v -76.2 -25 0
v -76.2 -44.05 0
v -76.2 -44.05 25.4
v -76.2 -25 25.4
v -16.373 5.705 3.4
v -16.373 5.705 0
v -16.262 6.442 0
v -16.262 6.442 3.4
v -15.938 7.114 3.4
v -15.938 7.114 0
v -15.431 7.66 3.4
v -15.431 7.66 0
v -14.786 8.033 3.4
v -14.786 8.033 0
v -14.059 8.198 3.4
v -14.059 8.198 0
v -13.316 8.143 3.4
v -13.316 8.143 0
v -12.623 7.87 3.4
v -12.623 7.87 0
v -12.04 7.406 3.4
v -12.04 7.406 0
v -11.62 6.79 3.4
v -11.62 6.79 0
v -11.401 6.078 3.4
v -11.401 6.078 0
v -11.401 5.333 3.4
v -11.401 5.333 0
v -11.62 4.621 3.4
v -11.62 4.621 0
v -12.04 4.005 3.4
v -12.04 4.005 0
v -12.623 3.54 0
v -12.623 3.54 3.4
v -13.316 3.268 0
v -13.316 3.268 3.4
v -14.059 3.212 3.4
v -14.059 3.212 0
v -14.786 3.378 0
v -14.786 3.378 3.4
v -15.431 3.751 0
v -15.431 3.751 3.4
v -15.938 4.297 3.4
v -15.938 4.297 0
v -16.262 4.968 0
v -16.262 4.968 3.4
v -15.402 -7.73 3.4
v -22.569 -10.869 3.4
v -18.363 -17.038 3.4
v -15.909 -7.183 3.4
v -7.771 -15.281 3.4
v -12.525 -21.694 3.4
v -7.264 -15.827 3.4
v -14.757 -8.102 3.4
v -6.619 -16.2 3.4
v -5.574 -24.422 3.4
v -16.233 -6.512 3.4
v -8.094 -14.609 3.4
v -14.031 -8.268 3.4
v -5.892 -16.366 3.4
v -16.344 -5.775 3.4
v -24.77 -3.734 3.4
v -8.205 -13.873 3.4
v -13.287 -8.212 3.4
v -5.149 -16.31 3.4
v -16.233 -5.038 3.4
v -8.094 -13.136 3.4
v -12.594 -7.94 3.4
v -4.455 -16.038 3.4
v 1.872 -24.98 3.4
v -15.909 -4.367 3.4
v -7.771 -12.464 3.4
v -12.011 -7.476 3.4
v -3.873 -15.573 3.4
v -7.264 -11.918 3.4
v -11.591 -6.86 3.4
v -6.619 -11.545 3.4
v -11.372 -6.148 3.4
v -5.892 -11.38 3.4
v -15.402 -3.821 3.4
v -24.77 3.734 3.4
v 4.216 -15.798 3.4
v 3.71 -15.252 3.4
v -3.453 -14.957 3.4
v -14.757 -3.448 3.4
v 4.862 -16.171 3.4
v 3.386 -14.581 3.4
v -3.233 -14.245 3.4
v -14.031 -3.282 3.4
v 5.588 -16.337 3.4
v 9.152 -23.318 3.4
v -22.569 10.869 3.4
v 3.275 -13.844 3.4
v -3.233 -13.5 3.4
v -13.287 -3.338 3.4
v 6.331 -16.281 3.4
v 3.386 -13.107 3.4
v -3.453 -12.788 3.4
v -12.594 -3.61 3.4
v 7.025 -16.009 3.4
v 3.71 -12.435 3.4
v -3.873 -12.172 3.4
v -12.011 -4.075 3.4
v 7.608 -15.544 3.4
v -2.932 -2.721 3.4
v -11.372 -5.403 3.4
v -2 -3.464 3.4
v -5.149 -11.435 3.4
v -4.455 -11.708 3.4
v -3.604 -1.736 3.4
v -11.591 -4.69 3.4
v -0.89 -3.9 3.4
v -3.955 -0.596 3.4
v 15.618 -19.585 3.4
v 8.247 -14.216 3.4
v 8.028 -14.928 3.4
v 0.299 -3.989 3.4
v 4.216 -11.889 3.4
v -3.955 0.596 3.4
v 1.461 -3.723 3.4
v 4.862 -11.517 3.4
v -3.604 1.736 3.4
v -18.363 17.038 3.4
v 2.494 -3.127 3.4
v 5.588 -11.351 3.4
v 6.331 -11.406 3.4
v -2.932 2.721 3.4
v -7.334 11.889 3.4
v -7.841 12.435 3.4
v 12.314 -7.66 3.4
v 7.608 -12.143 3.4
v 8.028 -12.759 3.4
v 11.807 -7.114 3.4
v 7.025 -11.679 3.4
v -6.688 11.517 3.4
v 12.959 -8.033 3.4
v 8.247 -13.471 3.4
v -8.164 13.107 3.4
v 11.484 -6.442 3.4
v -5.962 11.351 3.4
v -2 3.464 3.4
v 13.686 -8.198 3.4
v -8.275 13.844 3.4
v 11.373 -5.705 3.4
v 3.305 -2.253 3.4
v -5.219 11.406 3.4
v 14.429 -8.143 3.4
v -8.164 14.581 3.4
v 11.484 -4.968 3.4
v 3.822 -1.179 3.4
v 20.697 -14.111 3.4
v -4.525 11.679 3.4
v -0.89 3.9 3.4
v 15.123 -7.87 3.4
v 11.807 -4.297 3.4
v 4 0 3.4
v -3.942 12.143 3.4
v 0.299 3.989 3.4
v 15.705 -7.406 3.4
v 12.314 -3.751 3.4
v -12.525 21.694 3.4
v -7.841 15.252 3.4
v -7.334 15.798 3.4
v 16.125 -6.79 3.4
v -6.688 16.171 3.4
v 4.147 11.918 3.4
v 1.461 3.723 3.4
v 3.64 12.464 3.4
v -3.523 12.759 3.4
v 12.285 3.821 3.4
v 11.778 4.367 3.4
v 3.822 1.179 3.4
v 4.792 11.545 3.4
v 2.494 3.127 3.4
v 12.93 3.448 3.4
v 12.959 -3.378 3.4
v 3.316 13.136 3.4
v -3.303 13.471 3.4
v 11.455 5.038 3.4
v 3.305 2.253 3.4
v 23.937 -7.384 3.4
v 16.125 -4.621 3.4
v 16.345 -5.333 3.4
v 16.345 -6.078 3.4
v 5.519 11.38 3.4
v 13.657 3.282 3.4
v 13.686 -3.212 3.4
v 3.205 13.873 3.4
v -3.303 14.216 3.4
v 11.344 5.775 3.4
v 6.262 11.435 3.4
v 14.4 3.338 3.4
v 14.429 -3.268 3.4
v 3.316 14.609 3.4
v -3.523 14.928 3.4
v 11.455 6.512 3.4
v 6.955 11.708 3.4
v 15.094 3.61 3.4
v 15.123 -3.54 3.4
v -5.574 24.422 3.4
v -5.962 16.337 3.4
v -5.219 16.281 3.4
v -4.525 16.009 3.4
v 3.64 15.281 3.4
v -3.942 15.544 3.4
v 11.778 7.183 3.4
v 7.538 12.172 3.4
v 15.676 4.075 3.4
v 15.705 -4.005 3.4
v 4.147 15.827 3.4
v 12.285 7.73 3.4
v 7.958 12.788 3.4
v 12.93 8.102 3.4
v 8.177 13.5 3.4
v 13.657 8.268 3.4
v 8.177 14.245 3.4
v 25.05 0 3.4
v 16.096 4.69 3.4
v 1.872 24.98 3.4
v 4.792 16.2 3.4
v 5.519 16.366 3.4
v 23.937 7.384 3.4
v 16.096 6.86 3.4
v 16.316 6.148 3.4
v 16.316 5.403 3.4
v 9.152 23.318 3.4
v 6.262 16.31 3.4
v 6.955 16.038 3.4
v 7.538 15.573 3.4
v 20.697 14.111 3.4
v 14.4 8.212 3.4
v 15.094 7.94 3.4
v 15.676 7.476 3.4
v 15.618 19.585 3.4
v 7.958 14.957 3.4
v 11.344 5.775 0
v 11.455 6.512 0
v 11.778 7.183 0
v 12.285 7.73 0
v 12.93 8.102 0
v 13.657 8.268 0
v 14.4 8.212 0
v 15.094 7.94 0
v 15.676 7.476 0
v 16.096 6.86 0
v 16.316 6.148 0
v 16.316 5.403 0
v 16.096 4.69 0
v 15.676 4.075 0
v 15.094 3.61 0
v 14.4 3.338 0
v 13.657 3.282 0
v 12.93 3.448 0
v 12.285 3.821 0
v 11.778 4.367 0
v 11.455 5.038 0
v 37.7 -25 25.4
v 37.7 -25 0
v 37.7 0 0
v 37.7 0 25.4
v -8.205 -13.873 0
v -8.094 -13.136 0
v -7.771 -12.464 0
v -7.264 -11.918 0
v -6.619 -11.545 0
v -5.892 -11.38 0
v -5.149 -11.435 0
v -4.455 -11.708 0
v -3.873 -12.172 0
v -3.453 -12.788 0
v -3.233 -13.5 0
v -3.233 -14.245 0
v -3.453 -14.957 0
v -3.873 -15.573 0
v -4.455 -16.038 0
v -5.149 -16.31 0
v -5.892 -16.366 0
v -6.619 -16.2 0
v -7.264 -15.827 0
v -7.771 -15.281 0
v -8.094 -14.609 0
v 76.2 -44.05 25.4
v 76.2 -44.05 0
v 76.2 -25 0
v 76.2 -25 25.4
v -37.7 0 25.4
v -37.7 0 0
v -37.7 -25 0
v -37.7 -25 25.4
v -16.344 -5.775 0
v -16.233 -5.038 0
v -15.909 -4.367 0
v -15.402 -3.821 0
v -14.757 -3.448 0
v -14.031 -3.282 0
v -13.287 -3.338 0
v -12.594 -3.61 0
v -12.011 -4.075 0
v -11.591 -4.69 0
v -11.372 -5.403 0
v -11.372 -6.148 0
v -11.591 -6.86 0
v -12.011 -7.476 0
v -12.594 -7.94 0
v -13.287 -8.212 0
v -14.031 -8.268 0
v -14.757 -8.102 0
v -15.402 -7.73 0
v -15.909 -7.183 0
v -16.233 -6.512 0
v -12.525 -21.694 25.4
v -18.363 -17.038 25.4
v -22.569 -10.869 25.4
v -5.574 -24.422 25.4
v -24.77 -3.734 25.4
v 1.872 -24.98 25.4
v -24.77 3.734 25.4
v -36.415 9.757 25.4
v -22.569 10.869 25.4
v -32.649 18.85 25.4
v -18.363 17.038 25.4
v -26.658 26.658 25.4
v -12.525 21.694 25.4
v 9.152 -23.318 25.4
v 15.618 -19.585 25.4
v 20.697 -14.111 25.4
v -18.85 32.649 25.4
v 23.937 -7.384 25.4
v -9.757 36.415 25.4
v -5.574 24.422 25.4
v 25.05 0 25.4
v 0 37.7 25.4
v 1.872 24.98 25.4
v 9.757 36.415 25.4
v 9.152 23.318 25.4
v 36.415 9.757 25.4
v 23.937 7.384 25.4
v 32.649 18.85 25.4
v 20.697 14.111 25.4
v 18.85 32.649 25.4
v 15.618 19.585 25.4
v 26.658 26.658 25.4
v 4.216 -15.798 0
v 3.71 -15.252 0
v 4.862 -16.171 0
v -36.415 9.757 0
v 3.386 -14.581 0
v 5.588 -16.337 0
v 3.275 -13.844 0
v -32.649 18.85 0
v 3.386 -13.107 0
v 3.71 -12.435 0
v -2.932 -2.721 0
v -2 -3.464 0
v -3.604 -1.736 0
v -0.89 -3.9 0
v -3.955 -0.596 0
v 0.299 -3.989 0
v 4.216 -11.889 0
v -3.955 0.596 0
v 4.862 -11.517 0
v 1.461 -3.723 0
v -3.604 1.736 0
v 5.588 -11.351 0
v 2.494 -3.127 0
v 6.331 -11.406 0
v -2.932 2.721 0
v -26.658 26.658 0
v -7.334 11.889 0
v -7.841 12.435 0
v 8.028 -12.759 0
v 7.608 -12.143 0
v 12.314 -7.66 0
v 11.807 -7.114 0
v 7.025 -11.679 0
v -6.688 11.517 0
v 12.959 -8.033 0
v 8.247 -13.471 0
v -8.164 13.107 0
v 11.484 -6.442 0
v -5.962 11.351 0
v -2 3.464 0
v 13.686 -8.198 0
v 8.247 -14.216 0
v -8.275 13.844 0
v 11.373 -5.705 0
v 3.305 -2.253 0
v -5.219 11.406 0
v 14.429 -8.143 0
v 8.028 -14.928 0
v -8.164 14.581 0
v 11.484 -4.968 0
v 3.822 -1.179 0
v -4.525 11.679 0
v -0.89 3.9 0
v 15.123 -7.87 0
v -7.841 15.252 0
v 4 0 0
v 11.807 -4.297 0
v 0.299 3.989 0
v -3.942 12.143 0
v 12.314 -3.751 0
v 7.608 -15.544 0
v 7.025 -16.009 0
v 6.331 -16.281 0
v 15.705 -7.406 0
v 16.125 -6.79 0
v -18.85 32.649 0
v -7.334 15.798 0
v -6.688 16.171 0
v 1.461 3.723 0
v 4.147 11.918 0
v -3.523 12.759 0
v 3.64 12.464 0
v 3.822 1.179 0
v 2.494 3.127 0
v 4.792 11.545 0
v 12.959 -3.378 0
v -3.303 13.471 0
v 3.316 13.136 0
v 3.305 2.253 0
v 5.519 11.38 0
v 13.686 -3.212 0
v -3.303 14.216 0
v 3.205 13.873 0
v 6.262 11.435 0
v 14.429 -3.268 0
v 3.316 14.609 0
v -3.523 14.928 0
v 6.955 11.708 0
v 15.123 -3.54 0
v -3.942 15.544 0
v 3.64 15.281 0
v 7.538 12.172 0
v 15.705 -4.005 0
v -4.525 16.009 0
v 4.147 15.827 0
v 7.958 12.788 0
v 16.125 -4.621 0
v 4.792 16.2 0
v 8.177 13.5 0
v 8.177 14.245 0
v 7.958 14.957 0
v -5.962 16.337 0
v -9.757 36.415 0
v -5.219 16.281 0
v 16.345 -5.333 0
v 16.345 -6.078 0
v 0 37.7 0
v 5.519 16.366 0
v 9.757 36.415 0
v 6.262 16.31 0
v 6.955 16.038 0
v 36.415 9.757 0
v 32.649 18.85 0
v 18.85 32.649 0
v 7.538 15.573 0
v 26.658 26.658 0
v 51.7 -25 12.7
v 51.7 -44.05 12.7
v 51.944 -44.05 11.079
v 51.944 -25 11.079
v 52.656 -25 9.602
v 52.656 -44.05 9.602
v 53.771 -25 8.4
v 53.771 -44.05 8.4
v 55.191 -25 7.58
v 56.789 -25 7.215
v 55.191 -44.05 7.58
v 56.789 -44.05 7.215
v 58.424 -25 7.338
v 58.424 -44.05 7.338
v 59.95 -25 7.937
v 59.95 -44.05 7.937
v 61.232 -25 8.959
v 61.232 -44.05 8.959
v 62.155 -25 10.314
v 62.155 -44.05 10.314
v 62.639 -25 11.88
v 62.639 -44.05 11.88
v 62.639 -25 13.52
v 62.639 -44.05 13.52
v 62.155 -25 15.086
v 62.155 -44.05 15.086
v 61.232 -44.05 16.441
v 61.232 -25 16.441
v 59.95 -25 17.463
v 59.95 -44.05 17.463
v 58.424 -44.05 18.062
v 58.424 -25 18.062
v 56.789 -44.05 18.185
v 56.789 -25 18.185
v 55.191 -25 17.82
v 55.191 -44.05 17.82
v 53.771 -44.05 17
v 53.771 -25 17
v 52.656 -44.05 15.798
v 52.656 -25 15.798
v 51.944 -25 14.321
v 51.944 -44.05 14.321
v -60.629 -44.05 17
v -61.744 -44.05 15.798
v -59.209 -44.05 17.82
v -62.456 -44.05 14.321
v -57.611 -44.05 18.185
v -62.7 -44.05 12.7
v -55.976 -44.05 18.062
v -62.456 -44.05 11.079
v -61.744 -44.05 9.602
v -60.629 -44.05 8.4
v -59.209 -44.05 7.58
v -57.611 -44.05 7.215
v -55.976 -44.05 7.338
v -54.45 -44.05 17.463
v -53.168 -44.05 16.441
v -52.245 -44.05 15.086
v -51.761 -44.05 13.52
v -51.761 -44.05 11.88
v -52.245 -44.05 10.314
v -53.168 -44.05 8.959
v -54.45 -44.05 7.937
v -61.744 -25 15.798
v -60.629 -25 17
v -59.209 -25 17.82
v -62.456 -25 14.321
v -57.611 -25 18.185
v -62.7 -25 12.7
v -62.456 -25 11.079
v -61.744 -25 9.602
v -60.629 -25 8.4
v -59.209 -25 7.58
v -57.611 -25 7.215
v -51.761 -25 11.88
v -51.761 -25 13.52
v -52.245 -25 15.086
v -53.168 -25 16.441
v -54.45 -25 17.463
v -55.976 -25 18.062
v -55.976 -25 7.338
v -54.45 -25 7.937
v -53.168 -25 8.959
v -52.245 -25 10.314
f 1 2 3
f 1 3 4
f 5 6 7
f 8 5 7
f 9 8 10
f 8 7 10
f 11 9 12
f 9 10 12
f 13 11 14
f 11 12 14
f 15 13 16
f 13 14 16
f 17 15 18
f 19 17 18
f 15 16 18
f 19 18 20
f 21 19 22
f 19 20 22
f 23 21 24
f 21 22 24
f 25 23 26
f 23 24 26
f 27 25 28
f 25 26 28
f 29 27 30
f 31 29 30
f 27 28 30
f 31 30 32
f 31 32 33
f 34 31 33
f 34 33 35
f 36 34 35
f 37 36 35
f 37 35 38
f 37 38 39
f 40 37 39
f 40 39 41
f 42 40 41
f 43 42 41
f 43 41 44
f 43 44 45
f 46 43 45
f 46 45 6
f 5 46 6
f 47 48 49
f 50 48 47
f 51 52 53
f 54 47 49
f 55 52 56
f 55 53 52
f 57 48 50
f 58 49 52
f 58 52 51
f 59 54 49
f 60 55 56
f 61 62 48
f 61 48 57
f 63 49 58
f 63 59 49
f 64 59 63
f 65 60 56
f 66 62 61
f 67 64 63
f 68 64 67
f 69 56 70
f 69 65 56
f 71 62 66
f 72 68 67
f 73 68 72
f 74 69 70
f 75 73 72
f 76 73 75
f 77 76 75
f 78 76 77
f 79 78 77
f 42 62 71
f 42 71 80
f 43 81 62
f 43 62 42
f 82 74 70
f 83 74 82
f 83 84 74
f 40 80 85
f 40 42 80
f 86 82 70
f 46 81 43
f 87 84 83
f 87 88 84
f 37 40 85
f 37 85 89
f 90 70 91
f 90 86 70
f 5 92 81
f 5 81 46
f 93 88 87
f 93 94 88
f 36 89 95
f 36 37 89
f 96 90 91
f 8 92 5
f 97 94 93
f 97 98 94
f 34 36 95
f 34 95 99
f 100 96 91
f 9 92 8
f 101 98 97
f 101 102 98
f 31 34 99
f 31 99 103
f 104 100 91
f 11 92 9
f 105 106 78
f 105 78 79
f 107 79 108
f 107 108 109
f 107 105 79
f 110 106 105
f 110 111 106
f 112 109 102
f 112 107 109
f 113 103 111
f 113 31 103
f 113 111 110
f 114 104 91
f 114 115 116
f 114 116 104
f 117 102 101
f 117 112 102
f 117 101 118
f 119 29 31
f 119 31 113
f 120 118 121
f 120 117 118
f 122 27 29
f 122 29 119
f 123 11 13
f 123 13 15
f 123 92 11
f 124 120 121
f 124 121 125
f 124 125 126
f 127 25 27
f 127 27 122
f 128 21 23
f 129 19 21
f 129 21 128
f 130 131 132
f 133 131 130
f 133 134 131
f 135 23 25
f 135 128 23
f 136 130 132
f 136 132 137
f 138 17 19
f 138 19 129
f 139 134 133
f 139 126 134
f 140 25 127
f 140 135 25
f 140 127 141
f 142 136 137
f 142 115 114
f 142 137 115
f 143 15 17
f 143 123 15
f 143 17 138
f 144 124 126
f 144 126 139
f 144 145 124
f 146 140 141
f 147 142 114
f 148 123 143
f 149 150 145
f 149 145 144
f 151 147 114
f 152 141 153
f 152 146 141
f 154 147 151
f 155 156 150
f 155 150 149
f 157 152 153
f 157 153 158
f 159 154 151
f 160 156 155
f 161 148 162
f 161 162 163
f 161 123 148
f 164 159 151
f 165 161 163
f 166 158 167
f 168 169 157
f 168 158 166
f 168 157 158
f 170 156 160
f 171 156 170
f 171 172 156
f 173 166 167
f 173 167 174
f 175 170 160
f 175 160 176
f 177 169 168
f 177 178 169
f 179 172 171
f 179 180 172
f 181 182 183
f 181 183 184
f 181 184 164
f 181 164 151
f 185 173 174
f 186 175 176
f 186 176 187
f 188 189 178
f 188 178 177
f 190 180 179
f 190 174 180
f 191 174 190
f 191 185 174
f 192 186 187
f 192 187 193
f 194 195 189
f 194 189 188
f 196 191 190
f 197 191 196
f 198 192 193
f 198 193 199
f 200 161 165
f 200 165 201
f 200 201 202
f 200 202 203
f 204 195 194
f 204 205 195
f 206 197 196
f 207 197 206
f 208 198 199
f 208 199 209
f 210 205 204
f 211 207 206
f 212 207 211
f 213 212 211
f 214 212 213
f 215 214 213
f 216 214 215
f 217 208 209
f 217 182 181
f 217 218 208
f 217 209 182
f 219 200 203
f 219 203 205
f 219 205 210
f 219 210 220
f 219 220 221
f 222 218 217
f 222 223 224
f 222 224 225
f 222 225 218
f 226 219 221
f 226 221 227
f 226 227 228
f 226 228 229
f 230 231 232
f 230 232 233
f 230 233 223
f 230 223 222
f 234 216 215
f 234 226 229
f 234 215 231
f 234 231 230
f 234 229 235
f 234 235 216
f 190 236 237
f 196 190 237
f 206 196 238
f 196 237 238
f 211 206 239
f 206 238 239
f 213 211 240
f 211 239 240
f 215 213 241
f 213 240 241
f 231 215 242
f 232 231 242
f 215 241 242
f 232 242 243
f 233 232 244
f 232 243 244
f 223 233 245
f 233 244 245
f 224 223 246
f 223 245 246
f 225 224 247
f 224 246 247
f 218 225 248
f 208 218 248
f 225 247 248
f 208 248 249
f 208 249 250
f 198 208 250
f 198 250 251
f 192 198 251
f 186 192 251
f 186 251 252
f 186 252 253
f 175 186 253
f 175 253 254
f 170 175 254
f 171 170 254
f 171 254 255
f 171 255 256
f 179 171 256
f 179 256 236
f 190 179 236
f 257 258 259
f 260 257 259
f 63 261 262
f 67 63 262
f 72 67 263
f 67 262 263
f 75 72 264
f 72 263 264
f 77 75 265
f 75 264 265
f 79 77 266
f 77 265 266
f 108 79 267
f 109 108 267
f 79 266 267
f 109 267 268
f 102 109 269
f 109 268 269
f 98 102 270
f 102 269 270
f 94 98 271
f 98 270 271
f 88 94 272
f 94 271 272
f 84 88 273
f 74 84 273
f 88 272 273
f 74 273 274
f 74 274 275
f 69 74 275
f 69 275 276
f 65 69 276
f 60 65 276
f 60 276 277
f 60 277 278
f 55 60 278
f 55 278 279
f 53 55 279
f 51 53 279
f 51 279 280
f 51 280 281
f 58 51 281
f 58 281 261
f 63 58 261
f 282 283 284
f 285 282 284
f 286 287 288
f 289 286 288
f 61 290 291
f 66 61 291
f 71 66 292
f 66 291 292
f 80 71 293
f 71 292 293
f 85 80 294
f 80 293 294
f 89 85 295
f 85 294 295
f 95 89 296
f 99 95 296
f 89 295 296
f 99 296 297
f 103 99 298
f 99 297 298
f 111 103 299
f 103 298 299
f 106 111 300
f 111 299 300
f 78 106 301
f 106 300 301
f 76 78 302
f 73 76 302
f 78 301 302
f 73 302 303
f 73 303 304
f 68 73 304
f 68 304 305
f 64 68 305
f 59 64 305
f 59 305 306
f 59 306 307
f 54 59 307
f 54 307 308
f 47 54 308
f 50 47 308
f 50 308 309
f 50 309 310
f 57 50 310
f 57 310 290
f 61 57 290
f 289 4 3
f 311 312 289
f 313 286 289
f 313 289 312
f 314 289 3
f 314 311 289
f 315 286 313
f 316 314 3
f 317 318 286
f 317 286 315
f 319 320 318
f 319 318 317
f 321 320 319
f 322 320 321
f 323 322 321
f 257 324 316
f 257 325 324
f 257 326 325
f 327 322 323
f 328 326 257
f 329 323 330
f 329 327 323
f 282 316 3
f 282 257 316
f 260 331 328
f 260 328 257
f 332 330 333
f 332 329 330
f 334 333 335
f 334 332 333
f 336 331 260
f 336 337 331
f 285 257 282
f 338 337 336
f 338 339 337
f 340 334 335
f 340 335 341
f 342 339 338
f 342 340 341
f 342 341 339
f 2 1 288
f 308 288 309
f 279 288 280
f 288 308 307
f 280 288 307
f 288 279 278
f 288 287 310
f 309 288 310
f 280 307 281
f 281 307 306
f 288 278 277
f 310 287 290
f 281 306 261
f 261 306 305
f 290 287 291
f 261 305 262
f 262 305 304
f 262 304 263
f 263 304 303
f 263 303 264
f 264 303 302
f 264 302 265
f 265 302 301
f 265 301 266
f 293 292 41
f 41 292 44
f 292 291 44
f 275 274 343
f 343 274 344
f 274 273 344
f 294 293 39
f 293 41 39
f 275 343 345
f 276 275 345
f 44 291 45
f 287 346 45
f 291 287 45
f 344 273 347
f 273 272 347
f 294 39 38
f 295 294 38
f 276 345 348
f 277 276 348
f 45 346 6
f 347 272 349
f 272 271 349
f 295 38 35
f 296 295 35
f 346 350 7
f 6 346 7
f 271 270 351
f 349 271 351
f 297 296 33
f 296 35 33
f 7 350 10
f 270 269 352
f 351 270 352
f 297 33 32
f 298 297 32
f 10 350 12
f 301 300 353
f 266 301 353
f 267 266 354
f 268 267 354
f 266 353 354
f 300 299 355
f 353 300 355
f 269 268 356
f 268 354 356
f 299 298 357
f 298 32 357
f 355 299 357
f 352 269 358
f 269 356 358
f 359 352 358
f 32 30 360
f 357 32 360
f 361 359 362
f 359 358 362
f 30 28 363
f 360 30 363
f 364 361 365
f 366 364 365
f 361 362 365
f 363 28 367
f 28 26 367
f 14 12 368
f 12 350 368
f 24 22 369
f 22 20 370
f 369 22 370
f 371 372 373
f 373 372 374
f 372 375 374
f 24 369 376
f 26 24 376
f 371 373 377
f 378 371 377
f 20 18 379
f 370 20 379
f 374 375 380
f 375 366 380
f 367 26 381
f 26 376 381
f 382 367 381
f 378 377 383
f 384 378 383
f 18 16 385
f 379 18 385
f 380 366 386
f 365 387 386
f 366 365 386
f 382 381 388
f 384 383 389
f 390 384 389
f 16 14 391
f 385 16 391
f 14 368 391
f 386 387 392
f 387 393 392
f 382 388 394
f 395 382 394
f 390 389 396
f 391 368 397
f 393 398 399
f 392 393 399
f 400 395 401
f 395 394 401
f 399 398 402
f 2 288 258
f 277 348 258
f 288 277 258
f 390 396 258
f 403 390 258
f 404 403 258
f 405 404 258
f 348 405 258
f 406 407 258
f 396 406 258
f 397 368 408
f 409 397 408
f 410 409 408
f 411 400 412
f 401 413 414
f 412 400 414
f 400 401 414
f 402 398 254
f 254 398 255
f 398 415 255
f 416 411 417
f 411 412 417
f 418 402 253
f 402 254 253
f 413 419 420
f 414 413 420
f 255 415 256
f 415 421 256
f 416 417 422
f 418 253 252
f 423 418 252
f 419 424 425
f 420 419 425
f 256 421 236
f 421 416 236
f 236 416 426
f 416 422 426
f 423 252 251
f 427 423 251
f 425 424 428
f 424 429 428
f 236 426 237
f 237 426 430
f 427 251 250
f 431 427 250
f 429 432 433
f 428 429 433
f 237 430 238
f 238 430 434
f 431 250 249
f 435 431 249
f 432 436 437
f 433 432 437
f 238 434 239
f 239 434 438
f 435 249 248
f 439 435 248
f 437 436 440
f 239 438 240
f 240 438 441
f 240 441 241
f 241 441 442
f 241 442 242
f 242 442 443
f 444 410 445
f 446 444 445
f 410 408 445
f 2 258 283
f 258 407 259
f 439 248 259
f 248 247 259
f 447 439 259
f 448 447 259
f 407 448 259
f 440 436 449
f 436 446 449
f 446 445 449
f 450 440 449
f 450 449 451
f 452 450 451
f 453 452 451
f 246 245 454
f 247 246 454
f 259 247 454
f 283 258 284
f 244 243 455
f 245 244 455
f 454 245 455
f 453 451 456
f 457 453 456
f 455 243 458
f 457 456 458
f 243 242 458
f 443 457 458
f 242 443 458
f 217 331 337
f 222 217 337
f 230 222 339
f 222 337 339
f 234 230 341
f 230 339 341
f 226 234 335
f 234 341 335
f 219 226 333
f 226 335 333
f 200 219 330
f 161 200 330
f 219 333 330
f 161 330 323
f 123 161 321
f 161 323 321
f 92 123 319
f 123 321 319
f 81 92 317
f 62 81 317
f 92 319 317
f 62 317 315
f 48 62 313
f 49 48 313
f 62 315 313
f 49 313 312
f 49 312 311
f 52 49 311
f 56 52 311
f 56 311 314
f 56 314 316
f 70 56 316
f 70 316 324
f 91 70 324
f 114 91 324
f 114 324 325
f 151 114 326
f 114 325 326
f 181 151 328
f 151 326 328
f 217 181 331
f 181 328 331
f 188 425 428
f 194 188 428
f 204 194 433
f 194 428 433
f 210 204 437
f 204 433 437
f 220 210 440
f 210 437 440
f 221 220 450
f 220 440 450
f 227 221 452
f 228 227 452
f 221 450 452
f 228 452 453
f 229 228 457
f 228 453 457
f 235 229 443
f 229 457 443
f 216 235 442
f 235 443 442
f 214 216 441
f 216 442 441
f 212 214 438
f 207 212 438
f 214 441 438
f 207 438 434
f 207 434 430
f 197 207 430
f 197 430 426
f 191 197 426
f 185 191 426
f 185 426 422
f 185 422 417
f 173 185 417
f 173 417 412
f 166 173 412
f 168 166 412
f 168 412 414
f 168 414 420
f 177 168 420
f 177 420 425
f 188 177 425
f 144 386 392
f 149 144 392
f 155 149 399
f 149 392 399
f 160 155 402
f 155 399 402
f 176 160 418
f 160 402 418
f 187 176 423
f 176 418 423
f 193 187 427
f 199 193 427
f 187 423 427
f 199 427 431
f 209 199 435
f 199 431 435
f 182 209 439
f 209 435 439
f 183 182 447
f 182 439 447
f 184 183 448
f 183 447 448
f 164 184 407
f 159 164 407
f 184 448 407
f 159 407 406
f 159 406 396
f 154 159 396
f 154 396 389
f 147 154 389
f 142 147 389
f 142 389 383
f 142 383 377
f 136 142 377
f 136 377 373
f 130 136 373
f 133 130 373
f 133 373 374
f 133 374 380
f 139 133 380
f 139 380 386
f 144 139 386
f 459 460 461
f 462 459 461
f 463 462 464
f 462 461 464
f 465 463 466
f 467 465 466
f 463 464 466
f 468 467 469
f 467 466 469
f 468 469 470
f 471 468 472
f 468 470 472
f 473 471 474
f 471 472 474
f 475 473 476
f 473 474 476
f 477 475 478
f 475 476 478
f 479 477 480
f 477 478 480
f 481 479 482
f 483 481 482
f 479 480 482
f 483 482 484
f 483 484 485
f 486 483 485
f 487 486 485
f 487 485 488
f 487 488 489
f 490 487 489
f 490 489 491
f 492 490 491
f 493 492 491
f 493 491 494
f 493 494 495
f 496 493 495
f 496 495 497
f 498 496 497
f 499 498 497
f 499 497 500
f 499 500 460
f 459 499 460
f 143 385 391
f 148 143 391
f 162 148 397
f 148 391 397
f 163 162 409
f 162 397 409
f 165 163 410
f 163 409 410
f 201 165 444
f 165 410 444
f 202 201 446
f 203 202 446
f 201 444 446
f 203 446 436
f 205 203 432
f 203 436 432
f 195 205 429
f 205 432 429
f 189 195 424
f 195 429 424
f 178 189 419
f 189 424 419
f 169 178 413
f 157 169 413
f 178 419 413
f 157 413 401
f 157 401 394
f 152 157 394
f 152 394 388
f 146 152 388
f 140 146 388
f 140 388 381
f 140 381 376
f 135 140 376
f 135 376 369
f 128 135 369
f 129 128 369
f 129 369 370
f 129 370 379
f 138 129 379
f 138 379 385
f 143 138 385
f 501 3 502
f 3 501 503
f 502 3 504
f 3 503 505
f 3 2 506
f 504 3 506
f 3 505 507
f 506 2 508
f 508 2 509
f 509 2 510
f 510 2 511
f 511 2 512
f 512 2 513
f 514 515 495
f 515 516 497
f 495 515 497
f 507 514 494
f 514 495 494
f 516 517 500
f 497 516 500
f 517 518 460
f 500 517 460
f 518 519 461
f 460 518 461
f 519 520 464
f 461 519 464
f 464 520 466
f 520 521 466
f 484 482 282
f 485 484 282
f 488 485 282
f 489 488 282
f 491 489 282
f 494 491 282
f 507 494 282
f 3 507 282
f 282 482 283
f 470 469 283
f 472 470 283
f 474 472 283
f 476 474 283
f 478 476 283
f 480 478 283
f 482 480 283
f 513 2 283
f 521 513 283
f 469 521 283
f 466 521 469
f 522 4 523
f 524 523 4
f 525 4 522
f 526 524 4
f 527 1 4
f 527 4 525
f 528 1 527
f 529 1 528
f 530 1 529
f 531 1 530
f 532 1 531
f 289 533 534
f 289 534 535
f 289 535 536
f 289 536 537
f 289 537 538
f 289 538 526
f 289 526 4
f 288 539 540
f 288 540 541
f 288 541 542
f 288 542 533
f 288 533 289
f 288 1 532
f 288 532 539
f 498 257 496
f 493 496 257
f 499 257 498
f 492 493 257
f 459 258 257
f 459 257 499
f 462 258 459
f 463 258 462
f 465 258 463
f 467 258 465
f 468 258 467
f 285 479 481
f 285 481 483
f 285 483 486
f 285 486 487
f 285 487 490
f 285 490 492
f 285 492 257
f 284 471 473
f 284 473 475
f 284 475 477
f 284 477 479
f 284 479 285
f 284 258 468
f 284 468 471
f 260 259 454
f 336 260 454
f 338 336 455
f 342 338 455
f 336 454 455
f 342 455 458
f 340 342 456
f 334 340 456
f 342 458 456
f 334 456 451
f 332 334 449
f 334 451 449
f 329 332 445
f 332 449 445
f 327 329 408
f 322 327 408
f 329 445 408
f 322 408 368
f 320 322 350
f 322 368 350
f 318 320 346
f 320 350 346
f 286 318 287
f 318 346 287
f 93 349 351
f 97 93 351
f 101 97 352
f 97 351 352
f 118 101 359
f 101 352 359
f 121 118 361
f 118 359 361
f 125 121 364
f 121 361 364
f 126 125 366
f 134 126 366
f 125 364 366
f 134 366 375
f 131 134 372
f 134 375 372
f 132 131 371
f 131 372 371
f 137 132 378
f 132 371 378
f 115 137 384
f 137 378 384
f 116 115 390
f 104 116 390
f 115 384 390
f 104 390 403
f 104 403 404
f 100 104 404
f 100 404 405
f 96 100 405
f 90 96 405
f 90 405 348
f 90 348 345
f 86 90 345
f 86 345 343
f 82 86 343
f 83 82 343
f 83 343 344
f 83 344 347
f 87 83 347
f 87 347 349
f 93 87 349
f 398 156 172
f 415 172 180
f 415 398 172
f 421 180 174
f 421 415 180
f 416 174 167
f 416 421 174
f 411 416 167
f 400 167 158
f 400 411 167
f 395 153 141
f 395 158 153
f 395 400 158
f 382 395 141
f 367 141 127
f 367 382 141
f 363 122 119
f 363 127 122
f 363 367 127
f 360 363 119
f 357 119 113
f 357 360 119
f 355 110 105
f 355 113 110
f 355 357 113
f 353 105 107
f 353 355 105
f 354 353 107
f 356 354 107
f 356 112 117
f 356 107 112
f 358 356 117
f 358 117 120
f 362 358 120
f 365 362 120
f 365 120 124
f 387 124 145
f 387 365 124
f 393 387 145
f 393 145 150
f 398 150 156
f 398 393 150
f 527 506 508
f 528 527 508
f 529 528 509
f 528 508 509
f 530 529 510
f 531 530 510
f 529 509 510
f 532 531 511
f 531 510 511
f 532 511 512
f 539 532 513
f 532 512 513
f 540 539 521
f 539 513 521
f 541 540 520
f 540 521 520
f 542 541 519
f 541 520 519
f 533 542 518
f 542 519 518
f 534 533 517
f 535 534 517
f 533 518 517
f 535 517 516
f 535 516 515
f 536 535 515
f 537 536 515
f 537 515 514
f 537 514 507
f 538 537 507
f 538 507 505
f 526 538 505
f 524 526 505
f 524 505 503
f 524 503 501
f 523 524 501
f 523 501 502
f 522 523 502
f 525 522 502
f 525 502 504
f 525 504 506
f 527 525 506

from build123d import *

# Parameters (mm, degrees)
SKETCH1_W             = 152.4
SKETCH1_H             = 19.05
SKETCH1_R             = 4
BOSS_EXTRUDE1_DEPTH   = 25.4
SKETCH3_R             = 25.05
CUT_EXTRUDE1_DEPTH    = 22
M10_CLEARANCE_HOLE1_D = 11
SKETCH11_R            = 2.5
CUT_EXTRUDE2_DEPTH    = 10


with BuildPart() as part:
    # Sketch1 → Boss-Extrude1 (new body)
    with BuildSketch(Plane.XY):
        with Locations((0, -34.525)):
            Rectangle(SKETCH1_W, SKETCH1_H)
        with BuildLine():
            Line((-37.7, -25), (37.7, -25))
            Line((37.7, -25), (37.7, 0))
            ThreePointArc((37.7, 0), (0, 37.7), (-37.7, 0))
            Line((-37.7, 0), (-37.7, -25))
        make_face()
        Circle(SKETCH1_R, mode=Mode.SUBTRACT)
    extrude(amount=BOSS_EXTRUDE1_DEPTH)

    # Sketch3 → Cut-Extrude1 (cut)
    with BuildSketch(Plane.XY.offset(25.4)):
        Circle(SKETCH3_R)
    extrude(amount=-CUT_EXTRUDE1_DEPTH, mode=Mode.SUBTRACT)

    # M10 Clearance Hole1 (through all)
    with Locations(Plane(origin=(0, -25, 0), x_dir=(1, 0, 0), z_dir=(0, 1, 0))):
        with Locations((-57.2, -12.7), (57.2, -12.7)):
            Hole(M10_CLEARANCE_HOLE1_D / 2)

    # Sketch11 → Cut-Extrude2 (cut)
    with BuildSketch(Plane(origin=(0, 0, 0), x_dir=(-1, 0, 0), z_dir=(0, 0, -1))):
        with Locations((5.775120383, 13.84369837)):
            Circle(SKETCH11_R)
        with Locations((-5.705346209, 13.872599779)):
            Circle(SKETCH11_R)
        with Locations((-13.84369837, 5.775120383)):
            Circle(SKETCH11_R)
        with Locations((-13.872599779, -5.705346209)):
            Circle(SKETCH11_R)
        with Locations((-5.775120383, -13.84369837)):
            Circle(SKETCH11_R)
        with Locations((5.705346209, -13.872599779)):
            Circle(SKETCH11_R)
        with Locations((13.84369837, -5.775120383)):
            Circle(SKETCH11_R)
        with Locations((13.872599779, 5.705346209)):
            Circle(SKETCH11_R)
    extrude(amount=-CUT_EXTRUDE2_DEPTH, mode=Mode.SUBTRACT)


solid = part.part
